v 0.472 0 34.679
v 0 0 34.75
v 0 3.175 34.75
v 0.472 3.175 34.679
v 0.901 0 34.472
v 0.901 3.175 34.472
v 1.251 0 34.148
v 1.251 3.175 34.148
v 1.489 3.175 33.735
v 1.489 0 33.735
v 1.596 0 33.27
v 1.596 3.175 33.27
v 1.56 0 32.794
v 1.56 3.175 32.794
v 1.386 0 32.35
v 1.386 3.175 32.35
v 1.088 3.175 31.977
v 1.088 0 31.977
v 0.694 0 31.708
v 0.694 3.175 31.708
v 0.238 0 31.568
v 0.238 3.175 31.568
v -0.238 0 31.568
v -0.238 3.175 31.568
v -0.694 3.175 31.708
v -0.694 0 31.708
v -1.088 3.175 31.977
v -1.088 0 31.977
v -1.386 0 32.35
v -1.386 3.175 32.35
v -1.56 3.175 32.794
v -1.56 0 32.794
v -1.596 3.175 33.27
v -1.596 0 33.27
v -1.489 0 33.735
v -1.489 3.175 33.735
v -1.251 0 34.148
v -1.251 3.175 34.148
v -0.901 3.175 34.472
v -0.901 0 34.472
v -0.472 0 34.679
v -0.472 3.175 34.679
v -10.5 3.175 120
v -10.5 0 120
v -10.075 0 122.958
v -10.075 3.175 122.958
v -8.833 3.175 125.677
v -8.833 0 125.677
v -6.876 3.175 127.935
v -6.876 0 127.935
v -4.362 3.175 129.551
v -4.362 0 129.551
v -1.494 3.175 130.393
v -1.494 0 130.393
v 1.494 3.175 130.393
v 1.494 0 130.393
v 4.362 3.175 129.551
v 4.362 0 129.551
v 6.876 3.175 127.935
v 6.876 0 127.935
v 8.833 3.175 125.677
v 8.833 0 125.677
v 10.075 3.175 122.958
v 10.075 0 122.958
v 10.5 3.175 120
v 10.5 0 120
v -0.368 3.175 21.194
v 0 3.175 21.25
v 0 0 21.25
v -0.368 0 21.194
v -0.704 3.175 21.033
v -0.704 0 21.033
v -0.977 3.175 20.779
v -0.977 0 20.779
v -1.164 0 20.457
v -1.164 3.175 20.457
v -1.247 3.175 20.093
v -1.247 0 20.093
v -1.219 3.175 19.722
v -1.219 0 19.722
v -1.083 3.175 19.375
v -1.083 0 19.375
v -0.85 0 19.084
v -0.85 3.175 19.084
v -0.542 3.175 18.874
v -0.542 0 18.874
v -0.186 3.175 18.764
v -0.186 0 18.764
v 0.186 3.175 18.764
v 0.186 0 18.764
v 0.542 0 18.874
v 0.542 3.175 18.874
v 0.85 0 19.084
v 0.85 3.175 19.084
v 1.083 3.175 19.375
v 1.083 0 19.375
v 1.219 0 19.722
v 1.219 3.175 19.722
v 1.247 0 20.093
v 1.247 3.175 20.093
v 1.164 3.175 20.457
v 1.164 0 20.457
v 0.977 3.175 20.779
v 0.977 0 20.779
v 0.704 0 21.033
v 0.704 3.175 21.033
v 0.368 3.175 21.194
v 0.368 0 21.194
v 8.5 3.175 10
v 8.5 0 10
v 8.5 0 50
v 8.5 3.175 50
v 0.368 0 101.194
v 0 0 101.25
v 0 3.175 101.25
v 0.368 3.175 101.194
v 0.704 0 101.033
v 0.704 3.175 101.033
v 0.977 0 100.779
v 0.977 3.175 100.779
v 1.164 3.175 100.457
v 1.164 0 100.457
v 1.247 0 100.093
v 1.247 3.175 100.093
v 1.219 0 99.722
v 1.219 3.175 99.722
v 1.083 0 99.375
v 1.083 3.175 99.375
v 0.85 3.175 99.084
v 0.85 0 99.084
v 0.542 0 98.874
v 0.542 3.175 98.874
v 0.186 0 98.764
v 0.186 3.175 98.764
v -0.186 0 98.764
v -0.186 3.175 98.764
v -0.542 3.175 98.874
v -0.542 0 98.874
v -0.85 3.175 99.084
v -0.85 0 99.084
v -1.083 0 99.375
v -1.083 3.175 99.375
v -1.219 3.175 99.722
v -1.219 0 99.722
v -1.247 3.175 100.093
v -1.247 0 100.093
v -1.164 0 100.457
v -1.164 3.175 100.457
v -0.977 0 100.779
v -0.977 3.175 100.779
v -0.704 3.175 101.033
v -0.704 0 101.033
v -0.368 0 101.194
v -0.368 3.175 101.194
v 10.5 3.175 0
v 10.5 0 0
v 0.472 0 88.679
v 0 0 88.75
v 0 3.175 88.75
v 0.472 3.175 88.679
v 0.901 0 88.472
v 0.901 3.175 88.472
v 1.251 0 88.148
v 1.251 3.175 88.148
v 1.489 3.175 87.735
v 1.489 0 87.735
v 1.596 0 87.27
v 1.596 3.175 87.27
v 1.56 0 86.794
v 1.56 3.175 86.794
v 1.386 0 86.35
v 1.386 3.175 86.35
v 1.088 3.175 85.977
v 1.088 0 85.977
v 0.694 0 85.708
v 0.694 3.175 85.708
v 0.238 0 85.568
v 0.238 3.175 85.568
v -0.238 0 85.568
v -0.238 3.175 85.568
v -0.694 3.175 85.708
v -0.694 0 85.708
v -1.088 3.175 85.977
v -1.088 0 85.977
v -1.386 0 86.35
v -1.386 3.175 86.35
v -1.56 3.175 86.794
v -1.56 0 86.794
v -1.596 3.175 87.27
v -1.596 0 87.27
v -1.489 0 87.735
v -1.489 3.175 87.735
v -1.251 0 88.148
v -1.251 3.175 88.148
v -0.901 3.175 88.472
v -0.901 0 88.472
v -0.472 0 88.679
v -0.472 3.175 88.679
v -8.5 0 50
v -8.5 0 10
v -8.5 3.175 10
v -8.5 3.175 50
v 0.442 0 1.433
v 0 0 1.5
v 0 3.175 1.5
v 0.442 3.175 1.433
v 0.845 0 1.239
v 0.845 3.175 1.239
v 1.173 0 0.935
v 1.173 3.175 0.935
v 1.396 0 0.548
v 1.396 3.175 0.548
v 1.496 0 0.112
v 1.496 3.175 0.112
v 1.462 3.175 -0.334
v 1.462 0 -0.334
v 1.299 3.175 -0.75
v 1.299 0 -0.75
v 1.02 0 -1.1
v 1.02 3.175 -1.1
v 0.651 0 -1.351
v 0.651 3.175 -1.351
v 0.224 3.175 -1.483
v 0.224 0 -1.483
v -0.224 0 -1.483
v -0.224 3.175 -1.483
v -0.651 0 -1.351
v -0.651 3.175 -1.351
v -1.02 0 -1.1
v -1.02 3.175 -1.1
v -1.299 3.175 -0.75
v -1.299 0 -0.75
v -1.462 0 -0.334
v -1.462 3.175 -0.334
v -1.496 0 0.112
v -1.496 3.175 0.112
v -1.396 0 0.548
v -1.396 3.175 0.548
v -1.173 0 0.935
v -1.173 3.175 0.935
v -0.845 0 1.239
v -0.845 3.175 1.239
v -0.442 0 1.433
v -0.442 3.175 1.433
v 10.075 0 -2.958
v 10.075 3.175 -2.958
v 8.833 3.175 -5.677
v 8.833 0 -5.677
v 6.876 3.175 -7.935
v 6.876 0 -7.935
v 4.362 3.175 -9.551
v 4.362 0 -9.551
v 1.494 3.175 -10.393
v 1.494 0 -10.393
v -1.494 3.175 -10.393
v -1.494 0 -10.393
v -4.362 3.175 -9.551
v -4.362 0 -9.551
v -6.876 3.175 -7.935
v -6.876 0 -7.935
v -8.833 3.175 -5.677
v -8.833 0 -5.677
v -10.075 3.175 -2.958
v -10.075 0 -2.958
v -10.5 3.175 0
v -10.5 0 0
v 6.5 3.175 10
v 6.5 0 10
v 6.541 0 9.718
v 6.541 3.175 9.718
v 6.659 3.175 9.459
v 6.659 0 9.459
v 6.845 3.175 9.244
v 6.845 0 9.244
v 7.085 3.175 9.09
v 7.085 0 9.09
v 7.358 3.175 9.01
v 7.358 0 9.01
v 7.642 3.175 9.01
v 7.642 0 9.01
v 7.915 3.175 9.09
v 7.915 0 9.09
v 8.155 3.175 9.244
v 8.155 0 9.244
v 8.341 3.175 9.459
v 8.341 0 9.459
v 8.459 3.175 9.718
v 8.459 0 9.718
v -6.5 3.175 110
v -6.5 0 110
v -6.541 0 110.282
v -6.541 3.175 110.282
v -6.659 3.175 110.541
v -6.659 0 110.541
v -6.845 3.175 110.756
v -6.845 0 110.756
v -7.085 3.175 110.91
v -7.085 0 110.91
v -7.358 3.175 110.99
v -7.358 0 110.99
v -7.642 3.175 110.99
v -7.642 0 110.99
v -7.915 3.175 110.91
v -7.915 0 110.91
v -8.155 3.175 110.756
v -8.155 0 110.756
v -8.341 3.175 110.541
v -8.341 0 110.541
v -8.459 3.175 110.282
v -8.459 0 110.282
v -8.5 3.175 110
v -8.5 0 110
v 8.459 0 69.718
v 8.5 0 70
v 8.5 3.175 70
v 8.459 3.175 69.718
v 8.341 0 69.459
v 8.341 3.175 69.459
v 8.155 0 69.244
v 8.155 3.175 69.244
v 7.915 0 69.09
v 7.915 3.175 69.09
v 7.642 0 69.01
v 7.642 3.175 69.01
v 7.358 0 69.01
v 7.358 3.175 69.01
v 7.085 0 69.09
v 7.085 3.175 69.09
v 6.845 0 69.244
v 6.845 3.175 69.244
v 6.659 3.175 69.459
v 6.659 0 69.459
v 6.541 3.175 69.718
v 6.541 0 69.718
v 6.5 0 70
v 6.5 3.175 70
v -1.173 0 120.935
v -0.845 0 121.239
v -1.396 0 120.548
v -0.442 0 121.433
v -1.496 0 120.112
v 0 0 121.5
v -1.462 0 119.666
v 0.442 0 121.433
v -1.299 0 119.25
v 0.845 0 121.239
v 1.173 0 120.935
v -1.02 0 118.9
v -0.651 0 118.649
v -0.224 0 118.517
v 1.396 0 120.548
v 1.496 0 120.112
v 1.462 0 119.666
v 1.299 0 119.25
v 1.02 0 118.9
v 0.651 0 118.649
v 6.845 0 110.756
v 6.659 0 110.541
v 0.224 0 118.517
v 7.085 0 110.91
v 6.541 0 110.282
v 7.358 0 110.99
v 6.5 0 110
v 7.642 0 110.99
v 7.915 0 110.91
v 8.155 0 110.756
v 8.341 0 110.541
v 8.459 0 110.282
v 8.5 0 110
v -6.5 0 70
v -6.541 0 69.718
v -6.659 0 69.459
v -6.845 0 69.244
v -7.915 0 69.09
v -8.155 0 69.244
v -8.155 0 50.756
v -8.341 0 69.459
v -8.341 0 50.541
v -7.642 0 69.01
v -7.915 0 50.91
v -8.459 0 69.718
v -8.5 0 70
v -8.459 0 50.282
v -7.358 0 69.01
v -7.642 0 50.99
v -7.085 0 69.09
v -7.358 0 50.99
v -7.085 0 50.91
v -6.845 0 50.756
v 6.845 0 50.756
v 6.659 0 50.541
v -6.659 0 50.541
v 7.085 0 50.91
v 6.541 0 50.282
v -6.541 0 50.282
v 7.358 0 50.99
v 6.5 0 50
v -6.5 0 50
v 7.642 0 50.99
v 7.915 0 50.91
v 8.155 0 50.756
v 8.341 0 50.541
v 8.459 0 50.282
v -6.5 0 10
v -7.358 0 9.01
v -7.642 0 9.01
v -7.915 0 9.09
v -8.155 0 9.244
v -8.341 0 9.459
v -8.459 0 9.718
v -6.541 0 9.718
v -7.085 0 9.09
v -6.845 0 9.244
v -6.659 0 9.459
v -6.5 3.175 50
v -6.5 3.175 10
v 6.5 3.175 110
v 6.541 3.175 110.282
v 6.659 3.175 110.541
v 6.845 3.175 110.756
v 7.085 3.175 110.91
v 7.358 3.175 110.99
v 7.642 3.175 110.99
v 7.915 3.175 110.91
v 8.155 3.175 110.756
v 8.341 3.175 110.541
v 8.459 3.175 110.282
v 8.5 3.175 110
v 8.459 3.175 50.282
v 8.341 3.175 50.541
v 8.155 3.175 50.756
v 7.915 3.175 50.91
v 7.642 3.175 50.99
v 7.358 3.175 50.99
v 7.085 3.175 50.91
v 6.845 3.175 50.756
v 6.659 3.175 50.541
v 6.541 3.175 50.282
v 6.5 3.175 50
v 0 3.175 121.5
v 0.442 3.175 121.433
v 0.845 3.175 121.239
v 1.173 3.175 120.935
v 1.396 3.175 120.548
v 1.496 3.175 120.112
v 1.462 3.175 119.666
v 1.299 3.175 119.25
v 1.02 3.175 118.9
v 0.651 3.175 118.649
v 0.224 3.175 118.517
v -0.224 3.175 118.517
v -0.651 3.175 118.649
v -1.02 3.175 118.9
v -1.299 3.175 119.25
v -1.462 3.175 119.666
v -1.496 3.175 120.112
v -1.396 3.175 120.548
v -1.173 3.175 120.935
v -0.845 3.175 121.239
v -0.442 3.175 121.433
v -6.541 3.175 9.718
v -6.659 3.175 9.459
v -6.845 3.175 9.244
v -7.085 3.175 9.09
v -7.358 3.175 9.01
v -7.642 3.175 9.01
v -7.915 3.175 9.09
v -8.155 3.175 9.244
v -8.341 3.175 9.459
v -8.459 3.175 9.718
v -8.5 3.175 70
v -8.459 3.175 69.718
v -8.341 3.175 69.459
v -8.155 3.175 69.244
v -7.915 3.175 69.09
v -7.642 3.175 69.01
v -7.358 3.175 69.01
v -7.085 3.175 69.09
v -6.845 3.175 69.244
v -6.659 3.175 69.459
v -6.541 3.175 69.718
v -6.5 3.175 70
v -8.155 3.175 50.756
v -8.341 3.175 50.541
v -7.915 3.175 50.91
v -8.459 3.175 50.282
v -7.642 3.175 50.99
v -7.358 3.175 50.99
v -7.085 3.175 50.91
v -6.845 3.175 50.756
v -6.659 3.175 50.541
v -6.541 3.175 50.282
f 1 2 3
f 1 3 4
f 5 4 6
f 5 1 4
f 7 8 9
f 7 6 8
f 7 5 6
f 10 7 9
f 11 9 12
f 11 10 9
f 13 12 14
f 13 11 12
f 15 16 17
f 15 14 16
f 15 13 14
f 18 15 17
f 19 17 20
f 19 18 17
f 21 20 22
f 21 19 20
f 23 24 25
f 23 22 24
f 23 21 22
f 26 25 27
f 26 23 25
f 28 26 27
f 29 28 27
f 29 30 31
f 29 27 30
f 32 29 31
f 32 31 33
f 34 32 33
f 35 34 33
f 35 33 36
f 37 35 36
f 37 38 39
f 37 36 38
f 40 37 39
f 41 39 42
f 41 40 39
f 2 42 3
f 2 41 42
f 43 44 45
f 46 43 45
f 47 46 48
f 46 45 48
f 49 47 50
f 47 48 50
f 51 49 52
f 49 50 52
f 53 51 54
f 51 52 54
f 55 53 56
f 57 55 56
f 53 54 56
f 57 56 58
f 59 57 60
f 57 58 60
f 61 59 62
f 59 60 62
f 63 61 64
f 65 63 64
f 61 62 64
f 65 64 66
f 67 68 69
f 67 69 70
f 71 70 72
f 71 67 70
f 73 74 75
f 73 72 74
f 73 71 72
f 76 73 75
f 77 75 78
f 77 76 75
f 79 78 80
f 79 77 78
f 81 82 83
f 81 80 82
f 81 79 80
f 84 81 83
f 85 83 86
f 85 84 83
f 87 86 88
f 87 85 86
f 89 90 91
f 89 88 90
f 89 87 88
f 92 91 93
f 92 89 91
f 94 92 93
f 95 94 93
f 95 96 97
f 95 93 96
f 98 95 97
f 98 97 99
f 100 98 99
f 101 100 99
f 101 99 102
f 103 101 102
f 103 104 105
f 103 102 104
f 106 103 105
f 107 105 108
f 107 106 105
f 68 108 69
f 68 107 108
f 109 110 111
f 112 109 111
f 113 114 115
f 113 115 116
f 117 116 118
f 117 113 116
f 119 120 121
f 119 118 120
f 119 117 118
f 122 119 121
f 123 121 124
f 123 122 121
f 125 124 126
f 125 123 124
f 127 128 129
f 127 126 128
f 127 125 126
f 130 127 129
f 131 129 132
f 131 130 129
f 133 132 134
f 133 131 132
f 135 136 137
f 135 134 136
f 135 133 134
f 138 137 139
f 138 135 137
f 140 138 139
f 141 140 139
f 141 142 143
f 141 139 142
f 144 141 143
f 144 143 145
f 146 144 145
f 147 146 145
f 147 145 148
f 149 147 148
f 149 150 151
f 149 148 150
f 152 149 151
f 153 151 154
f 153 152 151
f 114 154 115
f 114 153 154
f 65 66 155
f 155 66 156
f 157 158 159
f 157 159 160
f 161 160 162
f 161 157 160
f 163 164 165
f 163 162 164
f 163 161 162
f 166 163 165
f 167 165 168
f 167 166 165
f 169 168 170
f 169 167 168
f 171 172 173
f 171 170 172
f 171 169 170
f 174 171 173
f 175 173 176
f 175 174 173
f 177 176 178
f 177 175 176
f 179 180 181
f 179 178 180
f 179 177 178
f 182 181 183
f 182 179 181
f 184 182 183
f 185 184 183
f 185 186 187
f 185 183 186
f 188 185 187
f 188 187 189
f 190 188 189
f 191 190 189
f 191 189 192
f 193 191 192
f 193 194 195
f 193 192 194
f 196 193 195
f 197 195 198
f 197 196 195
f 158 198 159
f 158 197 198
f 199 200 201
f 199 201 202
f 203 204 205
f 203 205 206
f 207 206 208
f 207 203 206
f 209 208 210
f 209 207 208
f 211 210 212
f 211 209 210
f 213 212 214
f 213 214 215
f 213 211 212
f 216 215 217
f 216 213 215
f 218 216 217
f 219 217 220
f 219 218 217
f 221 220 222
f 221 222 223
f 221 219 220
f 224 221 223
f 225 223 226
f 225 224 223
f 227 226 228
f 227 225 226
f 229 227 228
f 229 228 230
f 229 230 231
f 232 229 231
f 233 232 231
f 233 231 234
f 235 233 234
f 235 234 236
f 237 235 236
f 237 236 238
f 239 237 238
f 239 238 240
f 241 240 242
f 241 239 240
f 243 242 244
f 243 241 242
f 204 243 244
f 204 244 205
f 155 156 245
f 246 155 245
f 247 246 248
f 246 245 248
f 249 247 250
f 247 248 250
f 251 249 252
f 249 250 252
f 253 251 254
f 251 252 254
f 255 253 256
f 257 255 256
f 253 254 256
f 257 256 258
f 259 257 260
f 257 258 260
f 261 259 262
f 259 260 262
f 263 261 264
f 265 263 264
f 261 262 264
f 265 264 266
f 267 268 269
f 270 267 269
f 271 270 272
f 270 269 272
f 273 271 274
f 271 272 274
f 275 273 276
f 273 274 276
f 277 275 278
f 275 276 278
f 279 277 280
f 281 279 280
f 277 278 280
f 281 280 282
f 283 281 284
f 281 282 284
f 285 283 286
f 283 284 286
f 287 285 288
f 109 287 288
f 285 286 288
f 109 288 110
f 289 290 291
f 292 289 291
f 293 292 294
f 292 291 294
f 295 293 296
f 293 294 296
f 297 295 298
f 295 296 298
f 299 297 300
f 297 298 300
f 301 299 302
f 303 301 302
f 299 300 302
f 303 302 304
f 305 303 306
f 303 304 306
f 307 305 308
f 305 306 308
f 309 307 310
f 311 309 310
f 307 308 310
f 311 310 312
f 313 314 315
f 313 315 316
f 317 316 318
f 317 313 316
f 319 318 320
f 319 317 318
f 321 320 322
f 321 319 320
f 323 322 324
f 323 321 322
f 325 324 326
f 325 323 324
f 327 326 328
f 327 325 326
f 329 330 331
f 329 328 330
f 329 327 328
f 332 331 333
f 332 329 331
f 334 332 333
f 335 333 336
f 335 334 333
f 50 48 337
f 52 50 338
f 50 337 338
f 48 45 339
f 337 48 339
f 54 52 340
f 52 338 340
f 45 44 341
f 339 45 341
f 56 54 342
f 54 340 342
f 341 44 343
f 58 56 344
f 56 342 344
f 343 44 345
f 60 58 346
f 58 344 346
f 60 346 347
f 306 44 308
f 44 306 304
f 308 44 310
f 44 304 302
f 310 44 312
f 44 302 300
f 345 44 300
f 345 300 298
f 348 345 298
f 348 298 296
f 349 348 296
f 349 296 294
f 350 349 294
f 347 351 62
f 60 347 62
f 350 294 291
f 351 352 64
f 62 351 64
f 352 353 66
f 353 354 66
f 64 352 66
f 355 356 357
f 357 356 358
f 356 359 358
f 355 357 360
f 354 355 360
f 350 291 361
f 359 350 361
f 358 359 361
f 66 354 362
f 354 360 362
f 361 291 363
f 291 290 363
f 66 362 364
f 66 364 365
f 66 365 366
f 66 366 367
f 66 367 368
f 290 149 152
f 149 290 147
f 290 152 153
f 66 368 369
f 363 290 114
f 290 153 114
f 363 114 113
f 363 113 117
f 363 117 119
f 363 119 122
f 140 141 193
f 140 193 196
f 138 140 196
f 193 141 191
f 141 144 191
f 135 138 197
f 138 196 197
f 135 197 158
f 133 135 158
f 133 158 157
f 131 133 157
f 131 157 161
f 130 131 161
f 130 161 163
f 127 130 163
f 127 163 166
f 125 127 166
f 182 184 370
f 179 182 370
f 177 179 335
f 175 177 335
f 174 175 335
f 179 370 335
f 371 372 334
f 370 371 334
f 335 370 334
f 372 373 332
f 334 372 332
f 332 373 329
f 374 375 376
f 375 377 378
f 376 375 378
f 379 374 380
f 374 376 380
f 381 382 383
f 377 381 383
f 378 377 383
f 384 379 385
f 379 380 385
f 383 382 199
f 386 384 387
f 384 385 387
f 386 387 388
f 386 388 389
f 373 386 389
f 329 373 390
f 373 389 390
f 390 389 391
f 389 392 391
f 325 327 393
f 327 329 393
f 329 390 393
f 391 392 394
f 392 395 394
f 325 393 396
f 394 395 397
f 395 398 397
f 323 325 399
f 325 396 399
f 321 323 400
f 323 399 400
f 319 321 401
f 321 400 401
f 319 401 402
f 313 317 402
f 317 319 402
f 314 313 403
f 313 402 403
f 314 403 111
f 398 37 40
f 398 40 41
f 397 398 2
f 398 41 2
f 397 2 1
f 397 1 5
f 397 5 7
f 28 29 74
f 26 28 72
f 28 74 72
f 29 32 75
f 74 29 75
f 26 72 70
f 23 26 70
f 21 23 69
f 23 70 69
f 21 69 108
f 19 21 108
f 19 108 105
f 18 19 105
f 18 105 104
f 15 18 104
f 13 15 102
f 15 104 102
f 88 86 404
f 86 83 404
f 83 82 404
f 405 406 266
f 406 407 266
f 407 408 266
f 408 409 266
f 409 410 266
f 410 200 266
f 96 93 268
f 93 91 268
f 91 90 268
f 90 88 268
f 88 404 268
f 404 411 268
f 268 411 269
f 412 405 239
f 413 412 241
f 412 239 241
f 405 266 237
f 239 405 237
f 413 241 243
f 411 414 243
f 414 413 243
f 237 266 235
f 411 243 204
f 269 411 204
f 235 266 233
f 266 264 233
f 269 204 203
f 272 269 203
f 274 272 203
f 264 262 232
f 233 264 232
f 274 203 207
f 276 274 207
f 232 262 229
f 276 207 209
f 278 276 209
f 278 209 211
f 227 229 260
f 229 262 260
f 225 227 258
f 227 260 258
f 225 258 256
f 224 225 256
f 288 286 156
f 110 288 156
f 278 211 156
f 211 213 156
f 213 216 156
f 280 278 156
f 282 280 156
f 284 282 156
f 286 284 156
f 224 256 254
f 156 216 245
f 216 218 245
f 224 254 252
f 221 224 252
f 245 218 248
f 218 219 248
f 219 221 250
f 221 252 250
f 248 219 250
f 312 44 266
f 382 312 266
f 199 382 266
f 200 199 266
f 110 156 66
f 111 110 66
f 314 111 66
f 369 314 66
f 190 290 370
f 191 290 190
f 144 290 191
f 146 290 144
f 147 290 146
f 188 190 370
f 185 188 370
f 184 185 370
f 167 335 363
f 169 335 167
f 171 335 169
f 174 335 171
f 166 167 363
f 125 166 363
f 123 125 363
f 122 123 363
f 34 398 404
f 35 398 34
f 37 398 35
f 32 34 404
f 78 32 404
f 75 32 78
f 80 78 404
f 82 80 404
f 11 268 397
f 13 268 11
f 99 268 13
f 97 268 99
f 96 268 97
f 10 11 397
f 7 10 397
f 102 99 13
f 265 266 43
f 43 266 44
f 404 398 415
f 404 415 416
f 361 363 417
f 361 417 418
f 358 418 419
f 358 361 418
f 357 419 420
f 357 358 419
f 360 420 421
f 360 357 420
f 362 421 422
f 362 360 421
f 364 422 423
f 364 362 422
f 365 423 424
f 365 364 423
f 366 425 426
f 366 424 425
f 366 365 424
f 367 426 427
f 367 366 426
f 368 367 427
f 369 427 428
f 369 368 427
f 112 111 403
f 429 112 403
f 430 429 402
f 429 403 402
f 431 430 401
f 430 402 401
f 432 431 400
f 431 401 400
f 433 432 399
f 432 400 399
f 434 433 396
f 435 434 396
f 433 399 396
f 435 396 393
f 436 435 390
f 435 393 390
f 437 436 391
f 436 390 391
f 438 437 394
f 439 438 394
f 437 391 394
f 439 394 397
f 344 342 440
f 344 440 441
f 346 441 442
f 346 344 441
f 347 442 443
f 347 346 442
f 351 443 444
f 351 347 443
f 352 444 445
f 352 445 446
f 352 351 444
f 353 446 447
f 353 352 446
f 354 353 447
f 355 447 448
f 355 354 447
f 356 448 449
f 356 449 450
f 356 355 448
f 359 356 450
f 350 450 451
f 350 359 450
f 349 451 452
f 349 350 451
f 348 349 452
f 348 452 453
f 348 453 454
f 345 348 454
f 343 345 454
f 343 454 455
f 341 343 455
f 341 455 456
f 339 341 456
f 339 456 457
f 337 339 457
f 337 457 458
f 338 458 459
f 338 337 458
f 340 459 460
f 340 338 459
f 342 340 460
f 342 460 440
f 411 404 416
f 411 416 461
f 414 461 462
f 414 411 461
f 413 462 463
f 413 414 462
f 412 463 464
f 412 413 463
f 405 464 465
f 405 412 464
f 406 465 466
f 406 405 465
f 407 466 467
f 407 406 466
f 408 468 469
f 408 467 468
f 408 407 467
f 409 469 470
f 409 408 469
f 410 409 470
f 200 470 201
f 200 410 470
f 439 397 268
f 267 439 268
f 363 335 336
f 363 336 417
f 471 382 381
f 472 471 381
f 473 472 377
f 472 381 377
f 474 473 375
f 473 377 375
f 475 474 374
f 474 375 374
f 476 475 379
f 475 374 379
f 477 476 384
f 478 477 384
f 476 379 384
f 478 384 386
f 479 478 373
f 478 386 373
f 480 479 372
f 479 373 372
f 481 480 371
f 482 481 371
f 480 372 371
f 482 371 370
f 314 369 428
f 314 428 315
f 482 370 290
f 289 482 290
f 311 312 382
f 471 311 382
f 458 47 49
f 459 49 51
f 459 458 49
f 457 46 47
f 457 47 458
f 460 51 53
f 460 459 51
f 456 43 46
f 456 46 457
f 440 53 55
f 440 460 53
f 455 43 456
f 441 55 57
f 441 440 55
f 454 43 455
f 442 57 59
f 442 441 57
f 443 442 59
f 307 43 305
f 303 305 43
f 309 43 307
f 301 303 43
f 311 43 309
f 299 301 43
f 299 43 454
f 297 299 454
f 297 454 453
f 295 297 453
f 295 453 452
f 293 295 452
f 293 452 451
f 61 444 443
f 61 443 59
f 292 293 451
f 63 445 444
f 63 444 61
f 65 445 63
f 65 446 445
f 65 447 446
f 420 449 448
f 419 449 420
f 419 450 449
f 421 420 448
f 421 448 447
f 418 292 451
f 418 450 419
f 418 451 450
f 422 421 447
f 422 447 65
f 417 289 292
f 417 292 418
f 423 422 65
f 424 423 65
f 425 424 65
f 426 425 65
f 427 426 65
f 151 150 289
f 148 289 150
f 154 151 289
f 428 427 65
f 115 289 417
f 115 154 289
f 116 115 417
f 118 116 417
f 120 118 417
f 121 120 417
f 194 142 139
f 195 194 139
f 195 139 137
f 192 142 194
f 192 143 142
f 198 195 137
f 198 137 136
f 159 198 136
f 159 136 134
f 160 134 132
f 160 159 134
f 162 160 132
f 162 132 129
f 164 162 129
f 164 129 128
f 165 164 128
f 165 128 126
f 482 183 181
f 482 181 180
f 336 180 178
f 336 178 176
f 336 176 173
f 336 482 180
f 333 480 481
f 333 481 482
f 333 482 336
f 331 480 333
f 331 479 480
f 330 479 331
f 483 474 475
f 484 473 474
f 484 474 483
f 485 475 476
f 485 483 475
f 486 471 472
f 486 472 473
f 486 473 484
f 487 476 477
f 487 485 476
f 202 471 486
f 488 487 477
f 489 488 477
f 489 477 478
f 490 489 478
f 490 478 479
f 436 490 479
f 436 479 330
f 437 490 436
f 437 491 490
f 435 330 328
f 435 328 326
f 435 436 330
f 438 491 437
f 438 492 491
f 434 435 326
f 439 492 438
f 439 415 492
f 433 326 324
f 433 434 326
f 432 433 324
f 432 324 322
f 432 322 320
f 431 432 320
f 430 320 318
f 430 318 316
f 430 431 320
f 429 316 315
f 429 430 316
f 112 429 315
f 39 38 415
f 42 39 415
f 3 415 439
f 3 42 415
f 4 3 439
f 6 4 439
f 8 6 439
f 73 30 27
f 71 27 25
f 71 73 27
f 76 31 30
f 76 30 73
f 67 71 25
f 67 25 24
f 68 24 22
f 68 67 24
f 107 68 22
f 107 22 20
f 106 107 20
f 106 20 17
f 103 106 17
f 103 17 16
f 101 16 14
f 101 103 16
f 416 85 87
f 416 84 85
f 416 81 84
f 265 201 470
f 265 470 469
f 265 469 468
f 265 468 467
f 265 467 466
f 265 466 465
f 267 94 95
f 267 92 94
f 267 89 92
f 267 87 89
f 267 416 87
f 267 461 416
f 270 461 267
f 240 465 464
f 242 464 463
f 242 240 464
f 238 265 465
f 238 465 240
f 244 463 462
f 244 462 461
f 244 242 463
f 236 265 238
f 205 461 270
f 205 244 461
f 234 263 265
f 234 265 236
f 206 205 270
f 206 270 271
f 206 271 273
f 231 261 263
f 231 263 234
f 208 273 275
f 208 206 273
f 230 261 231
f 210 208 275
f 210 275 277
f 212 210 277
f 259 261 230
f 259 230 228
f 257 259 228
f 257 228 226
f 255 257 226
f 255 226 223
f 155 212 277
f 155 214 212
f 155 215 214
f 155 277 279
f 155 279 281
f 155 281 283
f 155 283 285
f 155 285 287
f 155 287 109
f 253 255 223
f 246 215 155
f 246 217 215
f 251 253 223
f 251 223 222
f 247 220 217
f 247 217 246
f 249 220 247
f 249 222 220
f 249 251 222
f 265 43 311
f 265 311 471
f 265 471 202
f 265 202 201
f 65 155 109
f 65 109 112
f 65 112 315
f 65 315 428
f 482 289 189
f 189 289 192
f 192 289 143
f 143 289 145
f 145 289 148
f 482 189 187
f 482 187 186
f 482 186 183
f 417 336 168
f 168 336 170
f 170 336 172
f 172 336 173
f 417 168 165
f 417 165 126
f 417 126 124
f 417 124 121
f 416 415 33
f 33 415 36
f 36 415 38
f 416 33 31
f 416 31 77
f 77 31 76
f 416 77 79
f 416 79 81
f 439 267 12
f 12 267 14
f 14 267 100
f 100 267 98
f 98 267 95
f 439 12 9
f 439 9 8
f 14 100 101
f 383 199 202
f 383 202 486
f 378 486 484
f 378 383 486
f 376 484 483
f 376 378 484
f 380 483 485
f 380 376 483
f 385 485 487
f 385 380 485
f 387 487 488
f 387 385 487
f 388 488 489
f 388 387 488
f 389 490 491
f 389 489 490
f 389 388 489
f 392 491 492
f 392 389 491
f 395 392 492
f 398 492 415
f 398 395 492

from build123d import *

# Parameters (mm, degrees)
SKETCH1_R               = 1.5
BOSS_EXTRUDE1_DEPTH     = 3.175
CUT_EXTRUDE1_DEPTH      = 131.960225355
CUT_EXTRUDE1_DEPTH_BACK = 131.960225355
CUT_EXTRUDE2_DEPTH      = 131.960225355
CUT_EXTRUDE2_DEPTH_BACK = 131.960225355
CUT_EXTRUDE3_DEPTH      = 131.960225355
CUT_EXTRUDE3_DEPTH_BACK = 131.960225355
SKETCH4_R               = 1.6
CUT_EXTRUDE4_DEPTH      = 40


with BuildPart() as part:
    # Sketch1 → Boss-Extrude1 (new body)
    with BuildSketch(Plane(origin=(0, 0, 0), x_dir=(1, 0, 0), z_dir=(0, 1, 0))):
        with BuildLine():
            Line((-10.5, 0), (-10.5, -120))
            ThreePointArc((-10.5, -120), (0, -130.5), (10.5, -120))
            Line((10.5, -120), (10.5, 0))
            ThreePointArc((10.5, 0), (0, 10.5), (-10.5, 0))
        make_face()
        with Locations(Location((0, 0, 0), (0, 0, 270))):
            Circle(SKETCH1_R, mode=Mode.SUBTRACT)
        with Locations(Location((0, -120, 0), (0, 0, 270))):
            Circle(SKETCH1_R, mode=Mode.SUBTRACT)
    extrude(amount=BOSS_EXTRUDE1_DEPTH)

    # Sketch2 → Cut-Extrude1 (cut, two sides: drawn at the far end of the back side and taken through both)
    with BuildSketch(Plane.XZ.offset(-CUT_EXTRUDE1_DEPTH_BACK)):
        with BuildLine():
            ThreePointArc((0, 18.75), (1.25, 20), (0, 21.25))
            ThreePointArc((0, 21.25), (-1.25, 20), (0, 18.75))
        make_face()
    extrude(amount=CUT_EXTRUDE1_DEPTH + CUT_EXTRUDE1_DEPTH_BACK, mode=Mode.SUBTRACT)

    # Sketch3 → Cut-Extrude2 (cut, two sides: drawn at the far end of the back side and taken through both)
    with BuildSketch(Plane(origin=(0, 3.175, 0), x_dir=(1, 0, 0), z_dir=(0, 1, 0)).offset(-CUT_EXTRUDE2_DEPTH_BACK)):
        with BuildLine():
            ThreePointArc((0, -98.75), (-1.25, -100), (0, -101.25))
            ThreePointArc((0, -101.25), (1.25, -100), (0, -98.75))
        make_face()
    extrude(amount=CUT_EXTRUDE2_DEPTH + CUT_EXTRUDE2_DEPTH_BACK, mode=Mode.SUBTRACT)

    # Sketch4 → Cut-Extrude3 (cut, two sides: drawn at the far end of the back side and taken through both)
    with BuildSketch(Plane(origin=(0, 3.175, 0), x_dir=(1, 0, 0), z_dir=(0, 1, 0)).offset(-CUT_EXTRUDE3_DEPTH_BACK)):
        with Locations(Location((0, -33.15, 0), (0, 0, 270))):
            Circle(SKETCH4_R)
        with Locations(Location((0, -87.15, 0), (0, 0, 270))):
            Circle(SKETCH4_R)
    extrude(amount=CUT_EXTRUDE3_DEPTH + CUT_EXTRUDE3_DEPTH_BACK, mode=Mode.SUBTRACT)

    # Sketch5 → Cut-Extrude4 (cut)
    with BuildSketch(Plane.XZ):
        with BuildLine():
            Line((-8.5, 10), (-8.5, 50))
            ThreePointArc((-8.5, 50), (-7.5, 51), (-6.5, 50))
            Line((-6.5, 50), (-6.5, 10))
            ThreePointArc((-6.5, 10), (-7.5, 9), (-8.5, 10))
        make_face()
        with BuildLine():
            Line((6.5, 50), (6.5, 10))
            ThreePointArc((6.5, 10), (7.5, 9), (8.5, 10))
            Line((8.5, 10), (8.5, 50))
            ThreePointArc((8.5, 50), (7.5, 51), (6.5, 50))
        make_face()
        with BuildLine():
            Line((8.5, 110), (8.5, 70))
            ThreePointArc((8.5, 70), (7.5, 69), (6.5, 70))
            Line((6.5, 70), (6.5, 110))
            ThreePointArc((6.5, 110), (7.5, 111), (8.5, 110))
        make_face()
        with BuildLine():
            Line((-6.5, 70), (-6.5, 110))
            ThreePointArc((-6.5, 110), (-7.5, 111), (-8.5, 110))
            Line((-8.5, 110), (-8.5, 70))
            ThreePointArc((-8.5, 70), (-7.5, 69), (-6.5, 70))
        make_face()
    extrude(amount=-CUT_EXTRUDE4_DEPTH, mode=Mode.SUBTRACT)


solid = part.part
